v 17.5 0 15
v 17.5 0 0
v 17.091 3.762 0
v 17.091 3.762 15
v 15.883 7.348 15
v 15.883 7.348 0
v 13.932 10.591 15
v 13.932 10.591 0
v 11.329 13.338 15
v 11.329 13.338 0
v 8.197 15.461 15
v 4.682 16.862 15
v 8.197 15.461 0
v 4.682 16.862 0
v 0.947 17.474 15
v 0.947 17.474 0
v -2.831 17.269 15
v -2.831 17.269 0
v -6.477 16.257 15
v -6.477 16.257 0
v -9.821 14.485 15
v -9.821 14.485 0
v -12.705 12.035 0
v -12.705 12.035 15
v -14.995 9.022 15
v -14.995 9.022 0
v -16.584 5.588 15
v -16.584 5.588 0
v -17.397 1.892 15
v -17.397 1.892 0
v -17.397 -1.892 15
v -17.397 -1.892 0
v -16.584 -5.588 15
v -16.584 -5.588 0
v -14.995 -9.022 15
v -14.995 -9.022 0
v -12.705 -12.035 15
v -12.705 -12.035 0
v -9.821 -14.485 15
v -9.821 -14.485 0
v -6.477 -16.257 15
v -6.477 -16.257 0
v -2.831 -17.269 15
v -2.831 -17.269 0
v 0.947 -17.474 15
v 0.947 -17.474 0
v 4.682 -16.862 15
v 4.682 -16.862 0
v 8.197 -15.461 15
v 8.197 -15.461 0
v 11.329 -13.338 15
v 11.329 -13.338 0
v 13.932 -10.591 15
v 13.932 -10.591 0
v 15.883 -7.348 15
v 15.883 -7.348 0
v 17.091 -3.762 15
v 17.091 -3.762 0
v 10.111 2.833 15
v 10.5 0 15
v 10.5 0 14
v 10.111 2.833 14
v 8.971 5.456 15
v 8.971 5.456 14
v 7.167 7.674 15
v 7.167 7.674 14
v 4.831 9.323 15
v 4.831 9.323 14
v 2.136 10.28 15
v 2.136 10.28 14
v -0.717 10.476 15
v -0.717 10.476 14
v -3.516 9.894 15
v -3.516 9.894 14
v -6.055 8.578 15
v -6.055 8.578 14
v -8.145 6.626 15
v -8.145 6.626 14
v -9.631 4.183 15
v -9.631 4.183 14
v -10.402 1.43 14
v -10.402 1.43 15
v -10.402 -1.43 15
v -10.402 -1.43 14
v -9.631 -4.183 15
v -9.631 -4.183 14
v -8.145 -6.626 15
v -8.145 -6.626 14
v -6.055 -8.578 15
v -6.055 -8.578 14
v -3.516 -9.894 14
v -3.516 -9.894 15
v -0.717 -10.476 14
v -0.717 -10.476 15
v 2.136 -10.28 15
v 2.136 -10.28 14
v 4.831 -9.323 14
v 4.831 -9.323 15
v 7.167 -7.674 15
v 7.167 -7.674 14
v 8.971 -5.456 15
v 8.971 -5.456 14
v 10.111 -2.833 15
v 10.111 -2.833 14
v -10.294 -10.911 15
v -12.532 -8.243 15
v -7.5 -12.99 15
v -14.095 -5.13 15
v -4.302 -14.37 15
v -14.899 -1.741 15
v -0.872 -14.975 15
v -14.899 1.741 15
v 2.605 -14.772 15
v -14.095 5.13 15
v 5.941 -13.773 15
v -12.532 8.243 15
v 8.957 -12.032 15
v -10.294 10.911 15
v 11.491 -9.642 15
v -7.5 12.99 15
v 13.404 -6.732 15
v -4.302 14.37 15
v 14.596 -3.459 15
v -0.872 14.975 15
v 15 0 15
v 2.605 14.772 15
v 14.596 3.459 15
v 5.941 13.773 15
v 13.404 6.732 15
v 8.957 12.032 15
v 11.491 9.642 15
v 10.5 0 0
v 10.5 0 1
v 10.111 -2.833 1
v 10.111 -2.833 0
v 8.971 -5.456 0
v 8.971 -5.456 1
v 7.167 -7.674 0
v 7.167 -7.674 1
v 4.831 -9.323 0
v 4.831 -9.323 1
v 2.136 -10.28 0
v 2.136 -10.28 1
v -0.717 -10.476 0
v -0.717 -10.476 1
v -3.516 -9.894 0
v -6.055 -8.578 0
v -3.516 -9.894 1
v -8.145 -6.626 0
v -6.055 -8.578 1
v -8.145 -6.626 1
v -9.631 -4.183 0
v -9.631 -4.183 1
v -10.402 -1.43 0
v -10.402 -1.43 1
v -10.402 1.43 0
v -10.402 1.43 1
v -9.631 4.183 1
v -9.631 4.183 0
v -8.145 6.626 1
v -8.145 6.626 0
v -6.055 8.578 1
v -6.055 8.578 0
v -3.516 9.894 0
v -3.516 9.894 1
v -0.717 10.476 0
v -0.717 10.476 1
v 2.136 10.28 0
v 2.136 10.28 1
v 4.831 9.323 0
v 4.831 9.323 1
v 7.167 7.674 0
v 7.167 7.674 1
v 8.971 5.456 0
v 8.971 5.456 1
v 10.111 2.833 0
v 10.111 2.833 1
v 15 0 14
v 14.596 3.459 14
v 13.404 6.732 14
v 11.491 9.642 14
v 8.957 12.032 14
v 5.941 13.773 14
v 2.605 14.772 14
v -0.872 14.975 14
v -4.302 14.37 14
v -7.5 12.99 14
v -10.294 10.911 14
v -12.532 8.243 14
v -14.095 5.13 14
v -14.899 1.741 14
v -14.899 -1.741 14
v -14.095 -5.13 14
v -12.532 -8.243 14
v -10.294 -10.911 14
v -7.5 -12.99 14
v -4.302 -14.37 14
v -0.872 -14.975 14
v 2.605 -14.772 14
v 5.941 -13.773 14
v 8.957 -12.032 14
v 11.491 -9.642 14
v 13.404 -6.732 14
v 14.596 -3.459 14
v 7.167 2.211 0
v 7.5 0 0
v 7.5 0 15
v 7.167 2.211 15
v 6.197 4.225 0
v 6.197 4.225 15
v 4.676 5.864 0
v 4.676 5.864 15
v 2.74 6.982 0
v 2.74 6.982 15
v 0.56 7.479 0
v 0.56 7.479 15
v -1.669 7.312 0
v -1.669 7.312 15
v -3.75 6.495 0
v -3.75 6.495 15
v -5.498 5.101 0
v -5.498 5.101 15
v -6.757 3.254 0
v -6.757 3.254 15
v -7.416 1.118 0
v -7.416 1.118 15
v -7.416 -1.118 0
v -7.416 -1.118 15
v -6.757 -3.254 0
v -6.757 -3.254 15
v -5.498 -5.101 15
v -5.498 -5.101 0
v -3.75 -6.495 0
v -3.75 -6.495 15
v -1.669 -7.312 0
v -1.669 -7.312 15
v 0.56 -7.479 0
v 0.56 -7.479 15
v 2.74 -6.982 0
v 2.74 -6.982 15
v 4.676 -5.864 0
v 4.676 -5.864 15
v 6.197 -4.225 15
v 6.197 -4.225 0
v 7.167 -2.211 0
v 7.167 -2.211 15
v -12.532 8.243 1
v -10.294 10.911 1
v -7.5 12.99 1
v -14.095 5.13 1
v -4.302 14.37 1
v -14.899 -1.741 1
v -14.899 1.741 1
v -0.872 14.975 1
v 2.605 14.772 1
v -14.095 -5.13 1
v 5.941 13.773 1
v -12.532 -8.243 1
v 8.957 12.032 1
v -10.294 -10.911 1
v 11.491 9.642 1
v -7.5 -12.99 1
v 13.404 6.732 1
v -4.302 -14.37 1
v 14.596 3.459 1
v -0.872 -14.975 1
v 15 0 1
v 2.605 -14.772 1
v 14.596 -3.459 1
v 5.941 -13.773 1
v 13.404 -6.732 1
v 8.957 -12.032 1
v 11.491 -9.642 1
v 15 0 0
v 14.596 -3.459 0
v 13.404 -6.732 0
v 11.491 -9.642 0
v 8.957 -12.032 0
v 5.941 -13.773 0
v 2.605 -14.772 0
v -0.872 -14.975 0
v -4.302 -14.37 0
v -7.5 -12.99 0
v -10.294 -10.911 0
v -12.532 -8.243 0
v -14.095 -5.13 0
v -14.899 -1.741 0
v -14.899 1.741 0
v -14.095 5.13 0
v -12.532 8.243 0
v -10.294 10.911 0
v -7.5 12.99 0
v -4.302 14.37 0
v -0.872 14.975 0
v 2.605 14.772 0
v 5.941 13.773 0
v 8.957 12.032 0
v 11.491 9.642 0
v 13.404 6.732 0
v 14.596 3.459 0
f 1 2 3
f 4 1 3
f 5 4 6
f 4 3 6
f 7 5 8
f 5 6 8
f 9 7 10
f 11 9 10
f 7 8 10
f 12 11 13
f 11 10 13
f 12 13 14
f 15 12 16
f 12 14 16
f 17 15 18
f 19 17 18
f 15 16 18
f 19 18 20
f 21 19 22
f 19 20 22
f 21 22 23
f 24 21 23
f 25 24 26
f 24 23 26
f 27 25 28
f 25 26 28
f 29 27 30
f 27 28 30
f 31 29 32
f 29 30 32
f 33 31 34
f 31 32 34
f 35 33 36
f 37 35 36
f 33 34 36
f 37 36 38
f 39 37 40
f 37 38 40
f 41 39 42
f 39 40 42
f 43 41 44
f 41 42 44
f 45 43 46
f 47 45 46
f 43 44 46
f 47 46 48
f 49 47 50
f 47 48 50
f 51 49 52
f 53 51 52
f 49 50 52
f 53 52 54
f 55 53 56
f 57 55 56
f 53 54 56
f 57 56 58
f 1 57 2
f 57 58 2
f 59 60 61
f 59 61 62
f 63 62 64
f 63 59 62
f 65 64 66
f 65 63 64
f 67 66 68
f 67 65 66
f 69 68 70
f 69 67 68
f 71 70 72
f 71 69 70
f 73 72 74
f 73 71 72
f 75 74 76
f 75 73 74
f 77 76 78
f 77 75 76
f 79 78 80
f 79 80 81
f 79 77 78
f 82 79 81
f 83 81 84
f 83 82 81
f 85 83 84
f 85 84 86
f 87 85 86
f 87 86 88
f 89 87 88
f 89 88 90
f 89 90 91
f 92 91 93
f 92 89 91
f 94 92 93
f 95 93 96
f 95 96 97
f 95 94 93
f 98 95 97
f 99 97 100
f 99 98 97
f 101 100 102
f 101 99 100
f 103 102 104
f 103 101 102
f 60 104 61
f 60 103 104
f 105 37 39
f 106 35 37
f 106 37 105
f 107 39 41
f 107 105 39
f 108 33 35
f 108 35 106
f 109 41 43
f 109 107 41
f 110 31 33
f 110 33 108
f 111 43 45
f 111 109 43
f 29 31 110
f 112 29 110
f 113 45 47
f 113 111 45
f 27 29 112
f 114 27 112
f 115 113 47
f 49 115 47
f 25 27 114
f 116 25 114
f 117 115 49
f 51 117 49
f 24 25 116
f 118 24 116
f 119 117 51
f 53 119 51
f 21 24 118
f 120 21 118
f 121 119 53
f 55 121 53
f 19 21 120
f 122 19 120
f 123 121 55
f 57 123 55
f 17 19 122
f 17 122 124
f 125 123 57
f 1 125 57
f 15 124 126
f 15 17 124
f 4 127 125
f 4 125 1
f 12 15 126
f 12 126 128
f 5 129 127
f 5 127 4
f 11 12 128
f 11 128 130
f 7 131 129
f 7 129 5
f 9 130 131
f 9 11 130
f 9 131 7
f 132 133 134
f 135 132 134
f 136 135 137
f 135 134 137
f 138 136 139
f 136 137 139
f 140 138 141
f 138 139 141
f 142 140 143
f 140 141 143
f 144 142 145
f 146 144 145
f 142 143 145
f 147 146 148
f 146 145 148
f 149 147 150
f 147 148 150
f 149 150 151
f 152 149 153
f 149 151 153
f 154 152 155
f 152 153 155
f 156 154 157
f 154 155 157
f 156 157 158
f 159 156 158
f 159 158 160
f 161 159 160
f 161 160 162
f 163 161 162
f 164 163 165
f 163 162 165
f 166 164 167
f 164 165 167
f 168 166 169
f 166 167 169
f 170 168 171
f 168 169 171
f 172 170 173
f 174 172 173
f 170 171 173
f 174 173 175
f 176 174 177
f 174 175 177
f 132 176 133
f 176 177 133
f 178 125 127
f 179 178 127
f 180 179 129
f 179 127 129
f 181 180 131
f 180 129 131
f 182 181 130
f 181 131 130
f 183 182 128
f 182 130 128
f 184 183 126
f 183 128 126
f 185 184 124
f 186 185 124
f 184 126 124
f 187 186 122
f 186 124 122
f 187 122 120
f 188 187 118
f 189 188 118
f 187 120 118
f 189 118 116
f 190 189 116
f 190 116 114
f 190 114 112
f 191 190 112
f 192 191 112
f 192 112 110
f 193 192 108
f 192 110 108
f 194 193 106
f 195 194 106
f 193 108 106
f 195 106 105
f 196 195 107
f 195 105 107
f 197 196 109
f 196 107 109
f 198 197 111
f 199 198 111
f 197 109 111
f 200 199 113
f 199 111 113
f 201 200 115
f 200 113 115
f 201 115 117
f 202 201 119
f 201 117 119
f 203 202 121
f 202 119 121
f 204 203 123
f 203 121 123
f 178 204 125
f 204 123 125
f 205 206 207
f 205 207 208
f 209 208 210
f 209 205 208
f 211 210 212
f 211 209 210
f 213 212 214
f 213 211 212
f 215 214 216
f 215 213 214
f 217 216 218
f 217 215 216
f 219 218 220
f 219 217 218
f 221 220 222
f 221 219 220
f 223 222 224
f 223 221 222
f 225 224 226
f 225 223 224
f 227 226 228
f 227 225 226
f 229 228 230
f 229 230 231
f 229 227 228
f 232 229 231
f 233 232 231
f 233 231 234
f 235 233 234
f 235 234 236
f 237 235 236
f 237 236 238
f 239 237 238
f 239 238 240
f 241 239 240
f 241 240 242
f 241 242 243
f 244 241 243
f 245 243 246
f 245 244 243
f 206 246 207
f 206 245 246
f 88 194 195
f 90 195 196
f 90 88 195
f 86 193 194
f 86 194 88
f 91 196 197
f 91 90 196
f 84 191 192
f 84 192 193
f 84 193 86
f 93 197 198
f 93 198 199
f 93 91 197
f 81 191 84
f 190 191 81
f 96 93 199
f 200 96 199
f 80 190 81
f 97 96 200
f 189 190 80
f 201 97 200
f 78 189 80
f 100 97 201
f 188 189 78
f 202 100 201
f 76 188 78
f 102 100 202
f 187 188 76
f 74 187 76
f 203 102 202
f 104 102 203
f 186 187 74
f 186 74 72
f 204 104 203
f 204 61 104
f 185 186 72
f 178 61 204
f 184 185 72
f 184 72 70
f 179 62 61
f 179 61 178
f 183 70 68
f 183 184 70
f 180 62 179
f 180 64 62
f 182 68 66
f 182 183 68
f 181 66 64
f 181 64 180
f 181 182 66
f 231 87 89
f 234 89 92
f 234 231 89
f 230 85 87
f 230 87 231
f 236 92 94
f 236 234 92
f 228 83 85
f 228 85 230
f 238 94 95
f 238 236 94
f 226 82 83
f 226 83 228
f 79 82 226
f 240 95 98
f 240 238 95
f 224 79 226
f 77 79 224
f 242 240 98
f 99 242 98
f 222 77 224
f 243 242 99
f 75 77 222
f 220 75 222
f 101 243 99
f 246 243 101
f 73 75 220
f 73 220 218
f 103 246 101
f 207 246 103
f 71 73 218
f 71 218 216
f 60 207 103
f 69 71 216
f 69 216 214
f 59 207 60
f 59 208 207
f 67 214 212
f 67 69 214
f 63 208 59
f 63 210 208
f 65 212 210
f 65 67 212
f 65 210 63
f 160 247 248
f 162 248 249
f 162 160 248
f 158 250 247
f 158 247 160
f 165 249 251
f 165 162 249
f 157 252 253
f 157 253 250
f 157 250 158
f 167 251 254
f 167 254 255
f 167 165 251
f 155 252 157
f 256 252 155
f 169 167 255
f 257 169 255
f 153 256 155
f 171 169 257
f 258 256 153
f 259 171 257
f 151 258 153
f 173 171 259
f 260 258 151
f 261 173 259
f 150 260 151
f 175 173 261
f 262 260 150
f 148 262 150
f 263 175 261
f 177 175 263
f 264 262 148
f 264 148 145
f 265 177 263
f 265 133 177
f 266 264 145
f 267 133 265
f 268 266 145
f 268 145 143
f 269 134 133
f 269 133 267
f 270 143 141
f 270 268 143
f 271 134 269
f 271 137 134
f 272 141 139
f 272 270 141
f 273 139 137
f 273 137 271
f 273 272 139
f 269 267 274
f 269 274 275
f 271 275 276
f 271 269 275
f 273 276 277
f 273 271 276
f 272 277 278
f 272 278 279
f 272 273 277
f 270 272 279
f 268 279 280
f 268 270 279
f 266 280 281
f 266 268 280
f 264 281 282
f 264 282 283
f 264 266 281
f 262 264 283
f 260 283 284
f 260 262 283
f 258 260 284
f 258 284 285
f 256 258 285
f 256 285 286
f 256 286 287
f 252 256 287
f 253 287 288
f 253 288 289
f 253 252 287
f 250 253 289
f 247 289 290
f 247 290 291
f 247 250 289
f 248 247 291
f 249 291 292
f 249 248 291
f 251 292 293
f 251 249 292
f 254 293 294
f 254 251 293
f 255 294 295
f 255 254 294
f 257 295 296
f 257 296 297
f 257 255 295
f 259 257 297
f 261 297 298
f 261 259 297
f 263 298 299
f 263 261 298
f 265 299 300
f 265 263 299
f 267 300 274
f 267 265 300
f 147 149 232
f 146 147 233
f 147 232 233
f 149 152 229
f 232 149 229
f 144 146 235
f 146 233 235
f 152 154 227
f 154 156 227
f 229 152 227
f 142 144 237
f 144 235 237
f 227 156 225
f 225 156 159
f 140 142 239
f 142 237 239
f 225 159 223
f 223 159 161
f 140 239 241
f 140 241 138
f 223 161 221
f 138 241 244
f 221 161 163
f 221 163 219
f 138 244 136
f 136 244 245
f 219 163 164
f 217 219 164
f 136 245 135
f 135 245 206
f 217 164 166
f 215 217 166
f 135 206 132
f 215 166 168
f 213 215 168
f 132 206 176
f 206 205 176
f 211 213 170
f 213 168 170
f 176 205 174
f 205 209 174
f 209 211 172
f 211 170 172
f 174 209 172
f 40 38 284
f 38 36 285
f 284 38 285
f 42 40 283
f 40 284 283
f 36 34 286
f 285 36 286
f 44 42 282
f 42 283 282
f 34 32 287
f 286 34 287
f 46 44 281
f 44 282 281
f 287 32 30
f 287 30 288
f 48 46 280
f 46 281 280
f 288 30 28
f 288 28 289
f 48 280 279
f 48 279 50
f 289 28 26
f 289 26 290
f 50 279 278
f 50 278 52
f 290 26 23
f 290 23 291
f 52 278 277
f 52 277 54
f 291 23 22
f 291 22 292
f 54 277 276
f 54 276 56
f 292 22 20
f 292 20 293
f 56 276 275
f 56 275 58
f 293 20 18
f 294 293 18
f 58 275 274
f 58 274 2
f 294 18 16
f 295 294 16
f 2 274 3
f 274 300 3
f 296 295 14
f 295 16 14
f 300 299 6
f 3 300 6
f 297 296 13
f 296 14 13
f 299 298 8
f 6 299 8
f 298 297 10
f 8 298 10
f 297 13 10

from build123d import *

# Parameters (mm, degrees)
SKETCH3_R           = 17.5
SKETCH3_R_2         = 7.5
BOSS_EXTRUDE1_DEPTH = 15
SKETCH4_R           = 15
SKETCH4_R_2         = 10.5
CUT_EXTRUDE1_DEPTH  = 1
CUT_EXTRUDE2_START  = -1
SKETCH5_R           = 15
SKETCH5_R_2         = 10.5
CUT_EXTRUDE2_DEPTH  = 1


with BuildPart() as part:
    # Sketch3 → Boss-Extrude1 (new body)
    with BuildSketch(Plane.XY):
        Circle(SKETCH3_R)
        Circle(SKETCH3_R_2, mode=Mode.SUBTRACT)
    extrude(amount=BOSS_EXTRUDE1_DEPTH)

    # Sketch4 → Cut-Extrude1 (cut)
    with BuildSketch(Plane.XY.offset(15)):
        Circle(SKETCH4_R)
        Circle(SKETCH4_R_2, mode=Mode.SUBTRACT)
    extrude(amount=-CUT_EXTRUDE1_DEPTH, mode=Mode.SUBTRACT)

    # Sketch5 → Cut-Extrude2 (cut)
    with BuildSketch(Plane(origin=(0, 0, 0), x_dir=(-1, 0, 0), z_dir=(0, 0, -1)).offset(CUT_EXTRUDE2_START)):
        with Locations(Location((0, 0, 0), (0, 0, 180))):
            Circle(SKETCH5_R)
        with Locations(Location((0, 0, 0), (0, 0, 180))):
            Circle(SKETCH5_R_2, mode=Mode.SUBTRACT)
    extrude(amount=CUT_EXTRUDE2_DEPTH, mode=Mode.SUBTRACT)


solid = part.part
